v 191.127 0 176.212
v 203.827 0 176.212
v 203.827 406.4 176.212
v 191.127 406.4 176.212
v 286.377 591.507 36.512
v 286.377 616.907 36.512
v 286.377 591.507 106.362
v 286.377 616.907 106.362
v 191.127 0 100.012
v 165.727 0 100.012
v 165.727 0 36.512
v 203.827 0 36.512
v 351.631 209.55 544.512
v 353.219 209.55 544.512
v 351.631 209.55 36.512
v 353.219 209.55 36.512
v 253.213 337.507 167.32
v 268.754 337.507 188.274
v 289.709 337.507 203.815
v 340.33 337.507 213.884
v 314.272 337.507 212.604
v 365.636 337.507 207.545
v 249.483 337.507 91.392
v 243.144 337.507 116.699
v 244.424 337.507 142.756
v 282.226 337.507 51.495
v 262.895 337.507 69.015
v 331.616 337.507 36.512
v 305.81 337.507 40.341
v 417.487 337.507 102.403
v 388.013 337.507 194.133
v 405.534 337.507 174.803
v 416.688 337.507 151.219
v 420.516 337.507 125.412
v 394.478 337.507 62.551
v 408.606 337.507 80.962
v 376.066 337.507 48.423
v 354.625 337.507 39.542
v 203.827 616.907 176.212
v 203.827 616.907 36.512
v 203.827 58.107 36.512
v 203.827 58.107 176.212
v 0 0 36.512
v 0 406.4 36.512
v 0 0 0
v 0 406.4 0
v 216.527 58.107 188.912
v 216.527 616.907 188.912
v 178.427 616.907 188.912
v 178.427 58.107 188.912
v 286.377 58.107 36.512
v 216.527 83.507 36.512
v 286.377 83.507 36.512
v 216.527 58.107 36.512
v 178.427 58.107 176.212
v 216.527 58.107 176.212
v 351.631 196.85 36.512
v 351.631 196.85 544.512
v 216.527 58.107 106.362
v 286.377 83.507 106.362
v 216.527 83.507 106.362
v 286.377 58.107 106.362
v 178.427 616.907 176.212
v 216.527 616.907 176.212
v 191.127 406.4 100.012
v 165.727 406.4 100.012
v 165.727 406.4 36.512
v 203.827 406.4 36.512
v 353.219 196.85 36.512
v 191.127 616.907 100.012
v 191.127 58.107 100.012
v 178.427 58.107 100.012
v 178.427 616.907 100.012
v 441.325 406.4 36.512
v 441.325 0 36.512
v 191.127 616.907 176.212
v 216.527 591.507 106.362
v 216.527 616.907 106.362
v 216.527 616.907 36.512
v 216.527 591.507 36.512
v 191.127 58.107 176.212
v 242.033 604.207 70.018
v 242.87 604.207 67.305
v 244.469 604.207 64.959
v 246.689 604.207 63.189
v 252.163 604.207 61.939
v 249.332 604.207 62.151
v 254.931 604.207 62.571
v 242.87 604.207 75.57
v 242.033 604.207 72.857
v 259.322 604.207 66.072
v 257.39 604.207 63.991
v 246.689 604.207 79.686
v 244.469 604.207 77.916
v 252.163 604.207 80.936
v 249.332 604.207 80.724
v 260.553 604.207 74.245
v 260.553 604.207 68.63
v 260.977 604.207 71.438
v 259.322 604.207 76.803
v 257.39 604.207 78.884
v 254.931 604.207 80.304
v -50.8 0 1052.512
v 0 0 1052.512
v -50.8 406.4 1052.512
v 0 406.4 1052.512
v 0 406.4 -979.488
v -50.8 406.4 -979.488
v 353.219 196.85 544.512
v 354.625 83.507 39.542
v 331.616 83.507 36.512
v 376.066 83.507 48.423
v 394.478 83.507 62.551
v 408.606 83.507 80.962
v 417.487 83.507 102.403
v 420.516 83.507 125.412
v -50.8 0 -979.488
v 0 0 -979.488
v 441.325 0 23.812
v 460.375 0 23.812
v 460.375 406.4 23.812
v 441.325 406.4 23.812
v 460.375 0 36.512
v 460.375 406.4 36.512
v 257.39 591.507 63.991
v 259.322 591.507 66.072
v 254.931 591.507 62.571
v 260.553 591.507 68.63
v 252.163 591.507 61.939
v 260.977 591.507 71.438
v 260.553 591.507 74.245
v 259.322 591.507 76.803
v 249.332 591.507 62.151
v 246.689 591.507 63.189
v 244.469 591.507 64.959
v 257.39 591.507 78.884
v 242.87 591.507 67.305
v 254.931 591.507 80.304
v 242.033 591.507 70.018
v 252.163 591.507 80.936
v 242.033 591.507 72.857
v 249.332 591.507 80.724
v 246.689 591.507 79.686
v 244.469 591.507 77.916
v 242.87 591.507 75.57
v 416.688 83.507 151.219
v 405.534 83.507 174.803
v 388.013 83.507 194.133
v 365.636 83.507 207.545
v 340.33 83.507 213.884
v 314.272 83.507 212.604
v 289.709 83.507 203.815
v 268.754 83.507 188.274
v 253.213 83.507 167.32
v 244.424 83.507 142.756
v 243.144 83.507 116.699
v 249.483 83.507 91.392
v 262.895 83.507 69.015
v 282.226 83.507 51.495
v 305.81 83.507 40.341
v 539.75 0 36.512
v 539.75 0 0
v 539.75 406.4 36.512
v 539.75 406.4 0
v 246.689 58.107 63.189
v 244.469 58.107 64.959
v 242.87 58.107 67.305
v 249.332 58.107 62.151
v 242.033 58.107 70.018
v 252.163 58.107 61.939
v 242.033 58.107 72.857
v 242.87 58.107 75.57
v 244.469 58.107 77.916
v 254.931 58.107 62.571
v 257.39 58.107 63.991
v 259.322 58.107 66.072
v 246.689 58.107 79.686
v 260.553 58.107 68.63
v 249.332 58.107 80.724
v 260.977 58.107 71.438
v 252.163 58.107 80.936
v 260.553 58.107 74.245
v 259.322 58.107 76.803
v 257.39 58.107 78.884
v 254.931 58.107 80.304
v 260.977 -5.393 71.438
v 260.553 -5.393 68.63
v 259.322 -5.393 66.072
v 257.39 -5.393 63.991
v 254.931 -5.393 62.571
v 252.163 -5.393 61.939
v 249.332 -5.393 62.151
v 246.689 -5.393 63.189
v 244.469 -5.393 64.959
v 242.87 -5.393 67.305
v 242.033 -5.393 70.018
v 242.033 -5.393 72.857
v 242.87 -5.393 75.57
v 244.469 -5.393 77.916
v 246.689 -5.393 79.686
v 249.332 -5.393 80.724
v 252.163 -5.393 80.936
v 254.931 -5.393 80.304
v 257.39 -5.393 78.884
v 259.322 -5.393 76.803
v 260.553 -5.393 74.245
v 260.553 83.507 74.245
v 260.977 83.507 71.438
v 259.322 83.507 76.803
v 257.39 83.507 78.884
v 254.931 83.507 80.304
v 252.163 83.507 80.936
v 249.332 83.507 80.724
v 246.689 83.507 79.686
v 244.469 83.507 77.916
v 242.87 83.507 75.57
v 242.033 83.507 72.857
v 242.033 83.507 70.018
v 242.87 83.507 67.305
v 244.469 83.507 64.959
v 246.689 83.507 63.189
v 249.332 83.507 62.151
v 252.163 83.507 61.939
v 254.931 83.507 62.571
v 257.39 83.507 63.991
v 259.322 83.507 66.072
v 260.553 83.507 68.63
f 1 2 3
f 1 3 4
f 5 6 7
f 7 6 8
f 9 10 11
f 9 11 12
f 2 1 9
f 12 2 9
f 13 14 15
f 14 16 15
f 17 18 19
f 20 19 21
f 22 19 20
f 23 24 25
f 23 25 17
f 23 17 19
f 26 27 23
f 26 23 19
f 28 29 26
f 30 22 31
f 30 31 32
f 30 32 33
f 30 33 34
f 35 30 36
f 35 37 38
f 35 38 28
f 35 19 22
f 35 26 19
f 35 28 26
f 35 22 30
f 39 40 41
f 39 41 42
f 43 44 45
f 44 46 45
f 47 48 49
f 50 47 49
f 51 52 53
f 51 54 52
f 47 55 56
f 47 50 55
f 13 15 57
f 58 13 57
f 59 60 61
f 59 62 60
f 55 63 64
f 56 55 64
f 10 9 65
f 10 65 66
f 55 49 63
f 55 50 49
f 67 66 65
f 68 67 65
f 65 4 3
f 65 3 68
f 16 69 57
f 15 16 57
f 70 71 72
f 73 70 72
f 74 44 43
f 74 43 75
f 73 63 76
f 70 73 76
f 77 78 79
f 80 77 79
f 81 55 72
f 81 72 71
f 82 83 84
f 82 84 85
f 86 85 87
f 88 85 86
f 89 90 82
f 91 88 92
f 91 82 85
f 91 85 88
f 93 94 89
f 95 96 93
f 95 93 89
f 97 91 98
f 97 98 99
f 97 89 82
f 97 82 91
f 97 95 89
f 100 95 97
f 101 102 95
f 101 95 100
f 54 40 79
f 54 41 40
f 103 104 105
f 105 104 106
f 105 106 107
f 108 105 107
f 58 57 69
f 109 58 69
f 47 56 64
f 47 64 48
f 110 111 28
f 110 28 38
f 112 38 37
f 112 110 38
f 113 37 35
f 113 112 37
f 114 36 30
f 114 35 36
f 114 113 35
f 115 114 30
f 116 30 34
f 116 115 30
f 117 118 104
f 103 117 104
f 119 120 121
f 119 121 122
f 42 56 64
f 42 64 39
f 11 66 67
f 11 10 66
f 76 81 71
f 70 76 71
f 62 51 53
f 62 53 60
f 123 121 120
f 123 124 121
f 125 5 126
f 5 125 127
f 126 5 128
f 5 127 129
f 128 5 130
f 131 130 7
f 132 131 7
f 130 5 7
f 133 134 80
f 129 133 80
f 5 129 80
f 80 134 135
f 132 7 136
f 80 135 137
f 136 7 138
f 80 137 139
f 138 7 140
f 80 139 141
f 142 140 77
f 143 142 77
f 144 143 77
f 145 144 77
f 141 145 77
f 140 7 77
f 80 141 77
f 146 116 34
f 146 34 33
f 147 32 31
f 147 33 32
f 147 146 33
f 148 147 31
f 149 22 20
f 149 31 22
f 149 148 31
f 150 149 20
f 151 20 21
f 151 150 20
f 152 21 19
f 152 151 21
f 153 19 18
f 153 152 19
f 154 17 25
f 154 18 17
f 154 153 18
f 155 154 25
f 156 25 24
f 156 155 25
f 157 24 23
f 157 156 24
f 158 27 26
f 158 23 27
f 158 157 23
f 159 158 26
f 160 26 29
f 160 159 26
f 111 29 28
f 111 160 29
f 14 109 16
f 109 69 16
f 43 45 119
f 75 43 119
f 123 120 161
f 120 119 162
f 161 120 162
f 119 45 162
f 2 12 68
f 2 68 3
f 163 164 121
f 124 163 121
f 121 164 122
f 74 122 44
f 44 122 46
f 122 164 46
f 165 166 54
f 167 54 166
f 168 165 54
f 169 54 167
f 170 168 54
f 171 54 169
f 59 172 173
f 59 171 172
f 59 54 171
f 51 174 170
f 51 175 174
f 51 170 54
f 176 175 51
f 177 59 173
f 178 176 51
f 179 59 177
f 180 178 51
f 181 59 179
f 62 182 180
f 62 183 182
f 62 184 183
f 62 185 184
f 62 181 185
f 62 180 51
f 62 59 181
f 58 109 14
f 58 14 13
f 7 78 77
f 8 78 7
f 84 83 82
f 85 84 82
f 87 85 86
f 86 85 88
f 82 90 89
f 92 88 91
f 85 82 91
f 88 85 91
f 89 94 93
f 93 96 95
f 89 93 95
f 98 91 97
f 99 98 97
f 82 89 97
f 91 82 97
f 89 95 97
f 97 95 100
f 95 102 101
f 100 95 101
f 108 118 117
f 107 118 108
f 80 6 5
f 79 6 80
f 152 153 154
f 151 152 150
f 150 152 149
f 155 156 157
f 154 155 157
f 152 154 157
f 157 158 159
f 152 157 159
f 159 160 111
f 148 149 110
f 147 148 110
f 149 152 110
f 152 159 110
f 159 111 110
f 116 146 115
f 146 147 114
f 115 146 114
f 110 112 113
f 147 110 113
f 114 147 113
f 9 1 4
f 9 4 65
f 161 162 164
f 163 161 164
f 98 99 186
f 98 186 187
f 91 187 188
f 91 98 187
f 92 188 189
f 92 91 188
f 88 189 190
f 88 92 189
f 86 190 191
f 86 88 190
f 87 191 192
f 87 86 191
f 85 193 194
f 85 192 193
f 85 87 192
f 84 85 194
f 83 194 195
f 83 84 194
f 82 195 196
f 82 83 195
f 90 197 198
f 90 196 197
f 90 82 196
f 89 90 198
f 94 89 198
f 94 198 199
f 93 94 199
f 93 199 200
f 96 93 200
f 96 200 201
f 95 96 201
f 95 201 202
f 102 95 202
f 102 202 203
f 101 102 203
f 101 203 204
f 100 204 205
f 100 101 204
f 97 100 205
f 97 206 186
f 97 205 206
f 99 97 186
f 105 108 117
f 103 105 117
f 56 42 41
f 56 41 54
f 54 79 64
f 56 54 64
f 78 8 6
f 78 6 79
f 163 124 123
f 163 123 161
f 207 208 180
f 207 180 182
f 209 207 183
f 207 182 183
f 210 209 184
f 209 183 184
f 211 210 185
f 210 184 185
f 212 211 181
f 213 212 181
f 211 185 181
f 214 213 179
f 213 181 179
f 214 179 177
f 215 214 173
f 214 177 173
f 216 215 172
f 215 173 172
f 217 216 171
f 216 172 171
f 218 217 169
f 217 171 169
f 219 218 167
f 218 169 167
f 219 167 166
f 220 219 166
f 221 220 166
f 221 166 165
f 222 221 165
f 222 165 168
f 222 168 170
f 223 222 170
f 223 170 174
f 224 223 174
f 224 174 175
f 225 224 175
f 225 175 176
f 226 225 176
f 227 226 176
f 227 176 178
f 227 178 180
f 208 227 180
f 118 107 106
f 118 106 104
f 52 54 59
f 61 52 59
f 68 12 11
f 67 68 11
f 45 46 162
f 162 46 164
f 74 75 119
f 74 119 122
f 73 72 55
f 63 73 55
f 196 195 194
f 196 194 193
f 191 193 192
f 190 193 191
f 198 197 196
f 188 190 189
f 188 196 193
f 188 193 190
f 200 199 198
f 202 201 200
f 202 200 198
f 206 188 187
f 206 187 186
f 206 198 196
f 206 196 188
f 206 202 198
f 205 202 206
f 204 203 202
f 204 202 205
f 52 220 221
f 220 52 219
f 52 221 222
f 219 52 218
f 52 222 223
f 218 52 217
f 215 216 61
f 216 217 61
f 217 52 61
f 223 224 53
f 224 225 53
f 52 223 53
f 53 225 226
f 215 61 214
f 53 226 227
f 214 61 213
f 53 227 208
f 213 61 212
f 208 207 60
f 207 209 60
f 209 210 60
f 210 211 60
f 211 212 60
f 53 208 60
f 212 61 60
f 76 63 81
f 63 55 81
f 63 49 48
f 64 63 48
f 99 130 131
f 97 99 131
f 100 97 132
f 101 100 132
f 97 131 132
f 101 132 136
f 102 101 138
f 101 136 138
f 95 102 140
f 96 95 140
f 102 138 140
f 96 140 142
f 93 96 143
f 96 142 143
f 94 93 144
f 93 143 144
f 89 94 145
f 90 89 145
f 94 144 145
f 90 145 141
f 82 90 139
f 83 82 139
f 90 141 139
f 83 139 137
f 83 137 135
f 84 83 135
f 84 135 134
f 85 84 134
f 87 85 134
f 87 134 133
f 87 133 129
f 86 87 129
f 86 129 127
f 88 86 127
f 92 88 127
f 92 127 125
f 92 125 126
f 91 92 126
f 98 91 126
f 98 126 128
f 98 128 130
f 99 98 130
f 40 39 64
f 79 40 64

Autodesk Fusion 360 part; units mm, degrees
sketch "basicTable" plane through (0, 0, 0) normal (0, 0, 1) x (1, 0, 0) in component "table"
  line L0 (0, 0) -> (539.75, 0)
  line L1 (539.75, 0) -> (539.75, 406.4)
  line L2 (539.75, 406.4) -> (0, 406.4)
  line L3 (0, 406.4) -> (0, 0)
  dimension "d40" = 539.75
  dimension "d41" = 406.4
extrude "ExtrudeTableThickness" add sketch "basicTable" along normal blind 36.5125 makes body 1 in component "table"
sketch "miterOutline and Blade Placement" plane through (0, 0, 36.5125) normal (0, 0, 1) x (-1, 0, 0) in component "table"
  line L0 (0, -406.4) -> (0, 0)
  line L1 (0, 0) -> (-539.75, 0)
  line L2 (-539.75, 0) -> (-539.75, -406.4)
  line L3 (-539.75, -406.4) -> (0, -406.4)
  line L4 (-441.325, -406.4) -> (-460.375, -406.4)
  line L5 (-460.375, -406.4) -> (-460.375, 0)
  line L6 (-460.375, 0) -> (-441.325, 0)
  line L7 (-441.325, 0) -> (-441.325, -406.4)
  line L8 (-352.425, -406.4) -> (-352.425, 0) construction
  line L9 (-441.325, -203.2) -> (0, -203.2) construction
  point P0 (-352.425, -203.2)
  dimension "d44" = 79.375
  dimension "d45" = 19.05
  dimension "d46" = 88.9
  dimension "d47" = 203.2
extrude "ExtrudeMiterSlot" cut sketch "miterOutline and Blade Placement" against normal blind 12.7 contours L1 L3 L4 L5 L6 L7 bodies 1 in component "table"
sketch "Sketch1" plane through (0, 0, 36.5125) normal (0, 0, 1) x (-1, 0, 0) in component "BandsawBlade"
  line L0 (-351.6312, -196.85) -> (-353.2187, -196.85)
  line L1 (-353.2187, -196.85) -> (-353.2187, -209.55)
  line L2 (-353.2187, -209.55) -> (-351.6312, -209.55)
  line L3 (-351.6312, -209.55) -> (-351.6312, -196.85)
  line L4 (-351.6312, -196.85) -> (-353.2187, -209.55) construction
  line L5 (-353.2187, -196.85) -> (-351.6312, -209.55) construction
  point P0 (-352.425, -203.2)
  point P1 (-352.425, -203.2)
  dimension "d76" = 1.5875
  dimension "d77" = 12.7
extrude "Extrude1" add sketch "Sketch1" along normal blind 508 separate body makes body 2 in component "BandsawBlade"
sketch "logCylinder" plane through (0, 0, 0) normal (0, 1, 0) x (1, 0, 0) in component "Log"
  circle A0 centre (169.0248, -125.4125) radius 88.9
  line L0 (0, -36.5125) -> (441.325, -36.5125)
  point P0 (169.0248, -125.4125)
  point P1 (139.7, -76.2)
  dimension "d204" = 177.8
extrude "Extrude1'" add sketch "logCylinder" along normal blind 254 separate body makes body 3 in component "Log"
sketch "Sketch2" plane through (0, 0, 36.5125) normal (0, 0, 1) x (-1, 0, 0)
  line L0 (-441.325, 0) -> (-441.325, -406.4)
  line L1 (-441.325, -406.4) -> (0, -406.4)
  line L2 (0, -406.4) -> (0, 0)
  line L3 (0, 0) -> (-441.325, 0)
sketch "Sketch3" plane through (0, 0, 0) normal (0, -1, 0) x (1, 0, 0)
  line L0 (460.375, 36.5125) -> (460.375, 23.8125)
  line L1 (460.375, 23.8125) -> (441.325, 23.8125)
  line L2 (441.325, 23.8125) -> (441.325, 36.5125)
  line L3 (441.325, 36.5125) -> (0, 36.5125)
  line L4 (0, 36.5125) -> (0, 0)
  line L5 (0, 0) -> (539.75, 0)
  line L6 (539.75, 0) -> (539.75, 36.5125)
  line L7 (539.75, 36.5125) -> (460.375, 36.5125)
sketch "Sketch1 (2)" plane through (0, 0, 0) normal (0, -1, 0) x (1, 0, 0) in component "Fence"
  line L0 (441.325, 36.5125) -> (0, 36.5125)
  line L1 (38.1, 36.5125) -> (0, 36.5125)
  line L2 (38.1, 36.5125) -> (38.1, 176.2125)
  line L3 (38.1, 176.2125) -> (25.4, 176.2125)
  line L4 (25.4, 176.2125) -> (25.4, 100.0125)
  line L5 (25.4, 100.0125) -> (0, 100.0125)
  line L6 (0, 100.0125) -> (0, 36.5125)
  point P0 (0, 36.5125)
  dimension "d255" = 38.1
  dimension "d256" = 139.7
  dimension "d257" = 12.7
  dimension "d258" = 76.2
  dimension "d259" = 25.4
extrude "Extrude1''" add sketch "Sketch1 (2)" against normal blind 406.4 separate body makes body 4 in component "Fence"
sketch "leftJigPlate" plane through (0, 0, 0) normal (0, -1, 0) x (1, 0, 0) in component "jig"
  line L0 (25.4, 100.0125) -> (12.7, 100.0125)
  line L1 (12.7, 100.0125) -> (12.7, 176.2125)
  line L2 (12.7, 176.2125) -> (25.4, 176.2125)
  line L3 (25.4, 176.2125) -> (25.4, 100.0125)
  point P0 (25.4, 100.0125)
  dimension "d263" = 12.7
  dimension "d264" = 76.2
sketch "topJigPlate" plane through (0, 0, 0) normal (0, -1, 0) x (1, 0, 0) in component "jig"
  line L0 (12.7, 176.2125) -> (50.8, 176.2125)
  line L1 (50.8, 176.2125) -> (50.8, 188.9125)
  line L2 (50.8, 188.9125) -> (12.7, 188.9125)
  line L3 (12.7, 188.9125) -> (12.7, 176.2125)
  point P0 (12.7, 176.2125)
  dimension "d265" = 38.1
  dimension "d266" = 12.7
sketch "rightJigPlate" plane through (0, 0, 0) normal (0, -1, 0) x (1, 0, 0) in component "jig"
  line L0 (38.1, 36.5125) -> (38.1, 176.2125)
  line L1 (38.1, 176.2125) -> (25.4, 176.2125)
  line L2 (25.4, 176.2125) -> (25.4, 100.0125)
  line L3 (25.4, 100.0125) -> (0, 100.0125)
  line L4 (0, 100.0125) -> (0, 36.5125)
  line L5 (0, 36.5125) -> (38.1, 36.5125)
  line L6 (50.8, 176.2125) -> (38.1, 176.2125)
  line L7 (38.1, 176.2125) -> (38.1, 36.5125)
  line L8 (38.1, 36.5125) -> (50.8, 36.5125)
  line L9 (50.8, 36.5125) -> (50.8, 176.2125)
  point P0 (50.8, 176.2125)
extrude "Extrude1'''" add sketch "leftJigPlate" against normal blind 558.8 separate body makes body 5 in component "jig"
extrude "Extrude2" add sketch "topJigPlate" against normal blind 558.8 separate body makes body 6 in component "jig"
extrude "Extrude3" add sketch "rightJigPlate" against normal blind 558.8 separate body contours L0 L6 L7 L8 L9 makes body 7 in component "jig"
sketch "frontJigBlock" plane through (0, 0, 0) normal (0, -1, 0) x (1, 0, 0) in component "jig"
  line L0 (50.8, 36.5125) -> (50.8, 176.2125)
  line L1 (50.8, 176.2125) -> (38.1, 176.2125)
  line L2 (38.1, 176.2125) -> (38.1, 36.5125)
  line L3 (38.1, 36.5125) -> (50.8, 36.5125)
  line L4 (50.8, 36.5125) -> (120.65, 36.5125)
  line L5 (120.65, 36.5125) -> (120.65, 106.3625)
  line L6 (120.65, 106.3625) -> (50.8, 106.3625)
  line L7 (50.8, 106.3625) -> (50.8, 36.5125)
  dimension "d274" = 69.85
  dimension "d275" = 69.85
sketch "backJigBlock" plane through (0, 558.8, 0) normal (0, 1, 0) x (-1, 0, 0) in component "jig"
  line L0 (-50.8, 176.2125) -> (-50.8, 36.5125)
  line L1 (-50.8, 36.5125) -> (-38.1, 36.5125)
  line L2 (-38.1, 36.5125) -> (-38.1, 176.2125)
  line L3 (-38.1, 176.2125) -> (-50.8, 176.2125)
  line L4 (-120.65, 36.5125) -> (-50.8, 36.5125)
  line L5 (-50.8, 106.3625) -> (-120.65, 106.3625)
  line L6 (-50.8, 36.5125) -> (-50.8, 106.3625)
  line L7 (-120.65, 36.5125) -> (-120.65, 106.3625)
  dimension "d277" = 69.85
  dimension "d278" = 69.85
extrude "Extrude4" add sketch "frontJigBlock" against normal blind 25.4 separate body contours L0 L4 L5 L6 L7 makes body 8 in component "jig"
extrude "Extrude5" add sketch "backJigBlock" against normal blind 25.4 separate body contours L0 L4 L5 L6 L7 makes body 9 in component "jig"
copy_body "Body->Comp1" bodies 5 removing the originals makes body 10 in component "leftJigPlate"
copy_body "Body->Comp2" bodies 8 removing the originals makes body 11 in component "frontJigPlate"
copy_body "Body->Comp3" bodies 6 removing the originals makes body 12 in component "topJigPlate"
copy_body "Body->Comp4" bodies 7 removing the originals makes body 13 in component "rightJigPlate"
copy_body "Body->Comp5" bodies 9 removing the originals makes body 14 in component "rearJigPlate"
sketch "Sketch1 (3)" plane through (0, 533.4, 0) normal (0, -1, 0) x (1, 0, 0) in component "rearJigPlate"
  line L0 (50.8, 106.3625) -> (50.8, 36.5125)
  line L1 (50.8, 36.5125) -> (120.65, 36.5125)
  line L2 (120.65, 36.5125) -> (120.65, 106.3625)
  line L3 (120.65, 106.3625) -> (50.8, 106.3625)
  line L4 (50.8, 71.4375) -> (120.65, 71.4375) construction
  line L5 (85.725, 106.3625) -> (85.725, 36.5125) construction
  circle A0 centre (85.725, 71.4375) radius 9.525
  dimension "d283" = 19.05
extrude "Extrude1''''" cut sketch "Sketch1 (3)" against normal blind 12.7 contours A0 bodies 14 in component "rearJigPlate"
sketch "Sketch1 (4)" plane through (0, 0, 0) normal (0, -1, 0) x (1, 0, 0) in component "frontJigPlate"
  line L0 (50.8, 106.3625) -> (50.8, 36.5125)
  line L1 (120.65, 36.5125) -> (120.65, 106.3625)
  line L2 (50.8, 71.4375) -> (120.65, 71.4375) construction
  line L3 (50.8, 36.5125) -> (120.65, 36.5125)
  line L4 (120.65, 106.3625) -> (50.8, 106.3625)
  line L5 (85.725, 36.5125) -> (85.725, 106.3625) construction
  circle A0 centre (85.725, 71.4375) radius 9.525
  dimension "d286" = 19.05
extrude "Extrude1'''''" cut sketch "Sketch1 (4)" against normal blind 25.4 contours A0 bodies 11 in component "frontJigPlate"
extrude "Extrude1''''''" add 1 faces at (86.3729, 546.1, 77.328) along direction (0, -1, 0) blind 609.6 separate body on bodies 14 makes body 15 in component "pipe"
sketch "centerPointTangentLine" plane through (0, 0, 0) normal (0, -1, 0) x (1, 0, 0) in component "Log"
  circle A0 centre (169.0248, 125.4125) radius 88.9
  line L0 (169.0248, 125.4125) -> (169.0248, 36.5125) construction
  line L1 (169.0248, 71.4375) -> (98.3855, 71.4375) construction
  point P0 (169.0248, 125.4125)
  point P1 (169.0248, 71.4375)
  dimension "d344" = 34.925
sketch "Sketch1 (5)" plane through (0, -63.5, 0) normal (0, -1, 0) x (1, 0, 0) in component "pipe"
  circle A0 centre (85.725, 71.4375) radius 9.525
  line L0 (85.725, 71.4375) -> (95.25, 71.4375) construction
  point P0 (85.725, 71.4375)
sketch "Sketch1 (6)" plane through (0, 0, 0) normal (-1, 0, 0) x (0, -1, 0) in component "bandsawFrame"
  line L0 (-406.4, 0) -> (0, 0)
  line L1 (0, 0) -> (0, 36.5125)
  line L2 (0, 36.5125) -> (-406.4, 36.5125)
  line L3 (-406.4, 36.5125) -> (-406.4, 0)
  line L4 (-406.4, 36.5125) -> (0, 36.5125)
  line L5 (0, 36.5125) -> (0, 1052.5125)
  line L6 (0, 1052.5125) -> (-406.4, 1052.5125)
  line L7 (-406.4, 1052.5125) -> (-406.4, 36.5125)
  line L8 (-406.4, 36.5125) -> (0, 36.5125)
  line L9 (0, 36.5125) -> (0, -979.4875)
  line L10 (0, -979.4875) -> (-406.4, -979.4875)
  line L11 (-406.4, -979.4875) -> (-406.4, 36.5125)
  dimension "d359" = 406.4
  dimension "d360" = 1016
  dimension "d361" = 406.4
  dimension "d362" = 1016
extrude "Extrude1'''''''" add sketch "Sketch1 (6)" along normal blind 50.8 separate body makes body 16 in component "bandsawFrame"
component "table" placed x (1, 0, 0) y (0, 1, 0) z (0, 0, 1) at (0, 0, 0)
component "BandsawBlade" placed x (1, 0, 0) y (0, 1, 0) z (0, 0, 1) at (0, 0, 0)
component "Log" placed x (1, 0, 0) y (0, 1, 0) z (0, 0, 1) at (162.5911, 83.5073, 0)
component "Fence" placed x (1, 0, 0) y (0, 1, 0) z (0, 0, 1) at (165.7266, 0, 0)
component "jig" placed x (1, 0, 0) y (0, 1, 0) z (0, 0, 1) at (165.7266, 58.1073, 0)
component "pipe" placed x (1, 0, 0) y (0, 1, 0) z (0, 0, 1) at (165.7266, 58.1073, 0)
component "bandsawFrame" placed x (1, 0, 0) y (0, 1, 0) z (0, 0, 1) at (0, 0, 0)
component "leftJigPlate" placed x (1, 0, 0) y (0, 1, 0) z (0, 0, 1) at (0, 0, 0) in component "jig"
component "frontJigPlate" placed x (1, 0, 0) y (0, 1, 0) z (0, 0, 1) at (0, 0, 0) in component "jig"
component "topJigPlate" placed x (1, 0, 0) y (0, 1, 0) z (0, 0, 1) at (0, 0, 0) in component "jig"
component "rightJigPlate" placed x (1, 0, 0) y (0, 1, 0) z (0, 0, 1) at (0, 0, 0) in component "jig"
component "rearJigPlate" placed x (1, 0, 0) y (0, 1, 0) z (0, 0, 1) at (0, 0, 0) in component "jig"
equation "tableWidth = 21.25 in"
equation "tableDepth = 16 in"
equation "miterWidth = 0.75 in"
equation "miterHeight = 0.5 in"
equation "tableThickness = 1 in + ( ( 7 / 16 ) * 1 in )"
equation "MiterEdgeToRightTableEdge = 3 in + ( ( 1 / 8 ) * 1 in )"
equation "MiterEdgeToBlade = 3.5 in"
equation "bladeDistanceFromFront = 8 in"
equation "d40 = tableWidth"
equation "d41 = tableDepth"
equation "d42 = tableThickness"
equation "d44 = MiterEdgeToRightTableEdge"
equation "d45 = miterWidth"
equation "d46 = MiterEdgeToBlade"
equation "d47 = bladeDistanceFromFront"
equation "d48 = -miterHeight"
equation "bladeThickness = ( 1 / 16 ) * 1 in"
equation "bladeWidth = ( 1 / 2 ) * 1 in"
equation "bladeHeight = 20 in"
equation "d76 = bladeThickness"
equation "d77 = bladeWidth"
equation "d78 = bladeHeight"
equation "d204 = logDiameter"
equation "logDiameter = 7 in"
equation "logDepth = 10 in"
equation "d207 = logDepth"
equation "d243 = logDiameter / 2"
equation "d245 = logDepth / 2"
equation "d260 = -tableDepth"
equation "d266 = ( 1 / 2 ) * 1 in"
equation "jigDepth = tableDepth + 6 in"
equation "d268 = -jigDepth"
equation "d270 = -jigDepth"
equation "d272 = -jigDepth"
equation "d274 = jigBlockWidth"
equation "d275 = jigBlockHeight"
equation "jigBlockDepth = 1 in"
equation "d277 = jigBlockWidth"
equation "d278 = jigBlockHeight"
equation "d279 = -jigBlockDepth"
equation "d281 = -jigBlockDepth"
equation "d283 = ( 3 / 4 ) * 1 in"
equation "d284 = -jigBlockDepth / 2"
equation "d286 = ( 3 / 4 ) * 1 in"
equation "d287 = -jigBlockDepth"
equation "d313 = pipeLength"
equation "pipeLength = 24 in"
equation "d333 = logDiameter / 2"
equation "d344 = jigBlockHeight / 2"
equation "jigBlockWidth = 2.75 in"
equation "jigBlockHeight = 2.75 in"
equation "d359 = tableDepth"
equation "d361 = tableDepth"
